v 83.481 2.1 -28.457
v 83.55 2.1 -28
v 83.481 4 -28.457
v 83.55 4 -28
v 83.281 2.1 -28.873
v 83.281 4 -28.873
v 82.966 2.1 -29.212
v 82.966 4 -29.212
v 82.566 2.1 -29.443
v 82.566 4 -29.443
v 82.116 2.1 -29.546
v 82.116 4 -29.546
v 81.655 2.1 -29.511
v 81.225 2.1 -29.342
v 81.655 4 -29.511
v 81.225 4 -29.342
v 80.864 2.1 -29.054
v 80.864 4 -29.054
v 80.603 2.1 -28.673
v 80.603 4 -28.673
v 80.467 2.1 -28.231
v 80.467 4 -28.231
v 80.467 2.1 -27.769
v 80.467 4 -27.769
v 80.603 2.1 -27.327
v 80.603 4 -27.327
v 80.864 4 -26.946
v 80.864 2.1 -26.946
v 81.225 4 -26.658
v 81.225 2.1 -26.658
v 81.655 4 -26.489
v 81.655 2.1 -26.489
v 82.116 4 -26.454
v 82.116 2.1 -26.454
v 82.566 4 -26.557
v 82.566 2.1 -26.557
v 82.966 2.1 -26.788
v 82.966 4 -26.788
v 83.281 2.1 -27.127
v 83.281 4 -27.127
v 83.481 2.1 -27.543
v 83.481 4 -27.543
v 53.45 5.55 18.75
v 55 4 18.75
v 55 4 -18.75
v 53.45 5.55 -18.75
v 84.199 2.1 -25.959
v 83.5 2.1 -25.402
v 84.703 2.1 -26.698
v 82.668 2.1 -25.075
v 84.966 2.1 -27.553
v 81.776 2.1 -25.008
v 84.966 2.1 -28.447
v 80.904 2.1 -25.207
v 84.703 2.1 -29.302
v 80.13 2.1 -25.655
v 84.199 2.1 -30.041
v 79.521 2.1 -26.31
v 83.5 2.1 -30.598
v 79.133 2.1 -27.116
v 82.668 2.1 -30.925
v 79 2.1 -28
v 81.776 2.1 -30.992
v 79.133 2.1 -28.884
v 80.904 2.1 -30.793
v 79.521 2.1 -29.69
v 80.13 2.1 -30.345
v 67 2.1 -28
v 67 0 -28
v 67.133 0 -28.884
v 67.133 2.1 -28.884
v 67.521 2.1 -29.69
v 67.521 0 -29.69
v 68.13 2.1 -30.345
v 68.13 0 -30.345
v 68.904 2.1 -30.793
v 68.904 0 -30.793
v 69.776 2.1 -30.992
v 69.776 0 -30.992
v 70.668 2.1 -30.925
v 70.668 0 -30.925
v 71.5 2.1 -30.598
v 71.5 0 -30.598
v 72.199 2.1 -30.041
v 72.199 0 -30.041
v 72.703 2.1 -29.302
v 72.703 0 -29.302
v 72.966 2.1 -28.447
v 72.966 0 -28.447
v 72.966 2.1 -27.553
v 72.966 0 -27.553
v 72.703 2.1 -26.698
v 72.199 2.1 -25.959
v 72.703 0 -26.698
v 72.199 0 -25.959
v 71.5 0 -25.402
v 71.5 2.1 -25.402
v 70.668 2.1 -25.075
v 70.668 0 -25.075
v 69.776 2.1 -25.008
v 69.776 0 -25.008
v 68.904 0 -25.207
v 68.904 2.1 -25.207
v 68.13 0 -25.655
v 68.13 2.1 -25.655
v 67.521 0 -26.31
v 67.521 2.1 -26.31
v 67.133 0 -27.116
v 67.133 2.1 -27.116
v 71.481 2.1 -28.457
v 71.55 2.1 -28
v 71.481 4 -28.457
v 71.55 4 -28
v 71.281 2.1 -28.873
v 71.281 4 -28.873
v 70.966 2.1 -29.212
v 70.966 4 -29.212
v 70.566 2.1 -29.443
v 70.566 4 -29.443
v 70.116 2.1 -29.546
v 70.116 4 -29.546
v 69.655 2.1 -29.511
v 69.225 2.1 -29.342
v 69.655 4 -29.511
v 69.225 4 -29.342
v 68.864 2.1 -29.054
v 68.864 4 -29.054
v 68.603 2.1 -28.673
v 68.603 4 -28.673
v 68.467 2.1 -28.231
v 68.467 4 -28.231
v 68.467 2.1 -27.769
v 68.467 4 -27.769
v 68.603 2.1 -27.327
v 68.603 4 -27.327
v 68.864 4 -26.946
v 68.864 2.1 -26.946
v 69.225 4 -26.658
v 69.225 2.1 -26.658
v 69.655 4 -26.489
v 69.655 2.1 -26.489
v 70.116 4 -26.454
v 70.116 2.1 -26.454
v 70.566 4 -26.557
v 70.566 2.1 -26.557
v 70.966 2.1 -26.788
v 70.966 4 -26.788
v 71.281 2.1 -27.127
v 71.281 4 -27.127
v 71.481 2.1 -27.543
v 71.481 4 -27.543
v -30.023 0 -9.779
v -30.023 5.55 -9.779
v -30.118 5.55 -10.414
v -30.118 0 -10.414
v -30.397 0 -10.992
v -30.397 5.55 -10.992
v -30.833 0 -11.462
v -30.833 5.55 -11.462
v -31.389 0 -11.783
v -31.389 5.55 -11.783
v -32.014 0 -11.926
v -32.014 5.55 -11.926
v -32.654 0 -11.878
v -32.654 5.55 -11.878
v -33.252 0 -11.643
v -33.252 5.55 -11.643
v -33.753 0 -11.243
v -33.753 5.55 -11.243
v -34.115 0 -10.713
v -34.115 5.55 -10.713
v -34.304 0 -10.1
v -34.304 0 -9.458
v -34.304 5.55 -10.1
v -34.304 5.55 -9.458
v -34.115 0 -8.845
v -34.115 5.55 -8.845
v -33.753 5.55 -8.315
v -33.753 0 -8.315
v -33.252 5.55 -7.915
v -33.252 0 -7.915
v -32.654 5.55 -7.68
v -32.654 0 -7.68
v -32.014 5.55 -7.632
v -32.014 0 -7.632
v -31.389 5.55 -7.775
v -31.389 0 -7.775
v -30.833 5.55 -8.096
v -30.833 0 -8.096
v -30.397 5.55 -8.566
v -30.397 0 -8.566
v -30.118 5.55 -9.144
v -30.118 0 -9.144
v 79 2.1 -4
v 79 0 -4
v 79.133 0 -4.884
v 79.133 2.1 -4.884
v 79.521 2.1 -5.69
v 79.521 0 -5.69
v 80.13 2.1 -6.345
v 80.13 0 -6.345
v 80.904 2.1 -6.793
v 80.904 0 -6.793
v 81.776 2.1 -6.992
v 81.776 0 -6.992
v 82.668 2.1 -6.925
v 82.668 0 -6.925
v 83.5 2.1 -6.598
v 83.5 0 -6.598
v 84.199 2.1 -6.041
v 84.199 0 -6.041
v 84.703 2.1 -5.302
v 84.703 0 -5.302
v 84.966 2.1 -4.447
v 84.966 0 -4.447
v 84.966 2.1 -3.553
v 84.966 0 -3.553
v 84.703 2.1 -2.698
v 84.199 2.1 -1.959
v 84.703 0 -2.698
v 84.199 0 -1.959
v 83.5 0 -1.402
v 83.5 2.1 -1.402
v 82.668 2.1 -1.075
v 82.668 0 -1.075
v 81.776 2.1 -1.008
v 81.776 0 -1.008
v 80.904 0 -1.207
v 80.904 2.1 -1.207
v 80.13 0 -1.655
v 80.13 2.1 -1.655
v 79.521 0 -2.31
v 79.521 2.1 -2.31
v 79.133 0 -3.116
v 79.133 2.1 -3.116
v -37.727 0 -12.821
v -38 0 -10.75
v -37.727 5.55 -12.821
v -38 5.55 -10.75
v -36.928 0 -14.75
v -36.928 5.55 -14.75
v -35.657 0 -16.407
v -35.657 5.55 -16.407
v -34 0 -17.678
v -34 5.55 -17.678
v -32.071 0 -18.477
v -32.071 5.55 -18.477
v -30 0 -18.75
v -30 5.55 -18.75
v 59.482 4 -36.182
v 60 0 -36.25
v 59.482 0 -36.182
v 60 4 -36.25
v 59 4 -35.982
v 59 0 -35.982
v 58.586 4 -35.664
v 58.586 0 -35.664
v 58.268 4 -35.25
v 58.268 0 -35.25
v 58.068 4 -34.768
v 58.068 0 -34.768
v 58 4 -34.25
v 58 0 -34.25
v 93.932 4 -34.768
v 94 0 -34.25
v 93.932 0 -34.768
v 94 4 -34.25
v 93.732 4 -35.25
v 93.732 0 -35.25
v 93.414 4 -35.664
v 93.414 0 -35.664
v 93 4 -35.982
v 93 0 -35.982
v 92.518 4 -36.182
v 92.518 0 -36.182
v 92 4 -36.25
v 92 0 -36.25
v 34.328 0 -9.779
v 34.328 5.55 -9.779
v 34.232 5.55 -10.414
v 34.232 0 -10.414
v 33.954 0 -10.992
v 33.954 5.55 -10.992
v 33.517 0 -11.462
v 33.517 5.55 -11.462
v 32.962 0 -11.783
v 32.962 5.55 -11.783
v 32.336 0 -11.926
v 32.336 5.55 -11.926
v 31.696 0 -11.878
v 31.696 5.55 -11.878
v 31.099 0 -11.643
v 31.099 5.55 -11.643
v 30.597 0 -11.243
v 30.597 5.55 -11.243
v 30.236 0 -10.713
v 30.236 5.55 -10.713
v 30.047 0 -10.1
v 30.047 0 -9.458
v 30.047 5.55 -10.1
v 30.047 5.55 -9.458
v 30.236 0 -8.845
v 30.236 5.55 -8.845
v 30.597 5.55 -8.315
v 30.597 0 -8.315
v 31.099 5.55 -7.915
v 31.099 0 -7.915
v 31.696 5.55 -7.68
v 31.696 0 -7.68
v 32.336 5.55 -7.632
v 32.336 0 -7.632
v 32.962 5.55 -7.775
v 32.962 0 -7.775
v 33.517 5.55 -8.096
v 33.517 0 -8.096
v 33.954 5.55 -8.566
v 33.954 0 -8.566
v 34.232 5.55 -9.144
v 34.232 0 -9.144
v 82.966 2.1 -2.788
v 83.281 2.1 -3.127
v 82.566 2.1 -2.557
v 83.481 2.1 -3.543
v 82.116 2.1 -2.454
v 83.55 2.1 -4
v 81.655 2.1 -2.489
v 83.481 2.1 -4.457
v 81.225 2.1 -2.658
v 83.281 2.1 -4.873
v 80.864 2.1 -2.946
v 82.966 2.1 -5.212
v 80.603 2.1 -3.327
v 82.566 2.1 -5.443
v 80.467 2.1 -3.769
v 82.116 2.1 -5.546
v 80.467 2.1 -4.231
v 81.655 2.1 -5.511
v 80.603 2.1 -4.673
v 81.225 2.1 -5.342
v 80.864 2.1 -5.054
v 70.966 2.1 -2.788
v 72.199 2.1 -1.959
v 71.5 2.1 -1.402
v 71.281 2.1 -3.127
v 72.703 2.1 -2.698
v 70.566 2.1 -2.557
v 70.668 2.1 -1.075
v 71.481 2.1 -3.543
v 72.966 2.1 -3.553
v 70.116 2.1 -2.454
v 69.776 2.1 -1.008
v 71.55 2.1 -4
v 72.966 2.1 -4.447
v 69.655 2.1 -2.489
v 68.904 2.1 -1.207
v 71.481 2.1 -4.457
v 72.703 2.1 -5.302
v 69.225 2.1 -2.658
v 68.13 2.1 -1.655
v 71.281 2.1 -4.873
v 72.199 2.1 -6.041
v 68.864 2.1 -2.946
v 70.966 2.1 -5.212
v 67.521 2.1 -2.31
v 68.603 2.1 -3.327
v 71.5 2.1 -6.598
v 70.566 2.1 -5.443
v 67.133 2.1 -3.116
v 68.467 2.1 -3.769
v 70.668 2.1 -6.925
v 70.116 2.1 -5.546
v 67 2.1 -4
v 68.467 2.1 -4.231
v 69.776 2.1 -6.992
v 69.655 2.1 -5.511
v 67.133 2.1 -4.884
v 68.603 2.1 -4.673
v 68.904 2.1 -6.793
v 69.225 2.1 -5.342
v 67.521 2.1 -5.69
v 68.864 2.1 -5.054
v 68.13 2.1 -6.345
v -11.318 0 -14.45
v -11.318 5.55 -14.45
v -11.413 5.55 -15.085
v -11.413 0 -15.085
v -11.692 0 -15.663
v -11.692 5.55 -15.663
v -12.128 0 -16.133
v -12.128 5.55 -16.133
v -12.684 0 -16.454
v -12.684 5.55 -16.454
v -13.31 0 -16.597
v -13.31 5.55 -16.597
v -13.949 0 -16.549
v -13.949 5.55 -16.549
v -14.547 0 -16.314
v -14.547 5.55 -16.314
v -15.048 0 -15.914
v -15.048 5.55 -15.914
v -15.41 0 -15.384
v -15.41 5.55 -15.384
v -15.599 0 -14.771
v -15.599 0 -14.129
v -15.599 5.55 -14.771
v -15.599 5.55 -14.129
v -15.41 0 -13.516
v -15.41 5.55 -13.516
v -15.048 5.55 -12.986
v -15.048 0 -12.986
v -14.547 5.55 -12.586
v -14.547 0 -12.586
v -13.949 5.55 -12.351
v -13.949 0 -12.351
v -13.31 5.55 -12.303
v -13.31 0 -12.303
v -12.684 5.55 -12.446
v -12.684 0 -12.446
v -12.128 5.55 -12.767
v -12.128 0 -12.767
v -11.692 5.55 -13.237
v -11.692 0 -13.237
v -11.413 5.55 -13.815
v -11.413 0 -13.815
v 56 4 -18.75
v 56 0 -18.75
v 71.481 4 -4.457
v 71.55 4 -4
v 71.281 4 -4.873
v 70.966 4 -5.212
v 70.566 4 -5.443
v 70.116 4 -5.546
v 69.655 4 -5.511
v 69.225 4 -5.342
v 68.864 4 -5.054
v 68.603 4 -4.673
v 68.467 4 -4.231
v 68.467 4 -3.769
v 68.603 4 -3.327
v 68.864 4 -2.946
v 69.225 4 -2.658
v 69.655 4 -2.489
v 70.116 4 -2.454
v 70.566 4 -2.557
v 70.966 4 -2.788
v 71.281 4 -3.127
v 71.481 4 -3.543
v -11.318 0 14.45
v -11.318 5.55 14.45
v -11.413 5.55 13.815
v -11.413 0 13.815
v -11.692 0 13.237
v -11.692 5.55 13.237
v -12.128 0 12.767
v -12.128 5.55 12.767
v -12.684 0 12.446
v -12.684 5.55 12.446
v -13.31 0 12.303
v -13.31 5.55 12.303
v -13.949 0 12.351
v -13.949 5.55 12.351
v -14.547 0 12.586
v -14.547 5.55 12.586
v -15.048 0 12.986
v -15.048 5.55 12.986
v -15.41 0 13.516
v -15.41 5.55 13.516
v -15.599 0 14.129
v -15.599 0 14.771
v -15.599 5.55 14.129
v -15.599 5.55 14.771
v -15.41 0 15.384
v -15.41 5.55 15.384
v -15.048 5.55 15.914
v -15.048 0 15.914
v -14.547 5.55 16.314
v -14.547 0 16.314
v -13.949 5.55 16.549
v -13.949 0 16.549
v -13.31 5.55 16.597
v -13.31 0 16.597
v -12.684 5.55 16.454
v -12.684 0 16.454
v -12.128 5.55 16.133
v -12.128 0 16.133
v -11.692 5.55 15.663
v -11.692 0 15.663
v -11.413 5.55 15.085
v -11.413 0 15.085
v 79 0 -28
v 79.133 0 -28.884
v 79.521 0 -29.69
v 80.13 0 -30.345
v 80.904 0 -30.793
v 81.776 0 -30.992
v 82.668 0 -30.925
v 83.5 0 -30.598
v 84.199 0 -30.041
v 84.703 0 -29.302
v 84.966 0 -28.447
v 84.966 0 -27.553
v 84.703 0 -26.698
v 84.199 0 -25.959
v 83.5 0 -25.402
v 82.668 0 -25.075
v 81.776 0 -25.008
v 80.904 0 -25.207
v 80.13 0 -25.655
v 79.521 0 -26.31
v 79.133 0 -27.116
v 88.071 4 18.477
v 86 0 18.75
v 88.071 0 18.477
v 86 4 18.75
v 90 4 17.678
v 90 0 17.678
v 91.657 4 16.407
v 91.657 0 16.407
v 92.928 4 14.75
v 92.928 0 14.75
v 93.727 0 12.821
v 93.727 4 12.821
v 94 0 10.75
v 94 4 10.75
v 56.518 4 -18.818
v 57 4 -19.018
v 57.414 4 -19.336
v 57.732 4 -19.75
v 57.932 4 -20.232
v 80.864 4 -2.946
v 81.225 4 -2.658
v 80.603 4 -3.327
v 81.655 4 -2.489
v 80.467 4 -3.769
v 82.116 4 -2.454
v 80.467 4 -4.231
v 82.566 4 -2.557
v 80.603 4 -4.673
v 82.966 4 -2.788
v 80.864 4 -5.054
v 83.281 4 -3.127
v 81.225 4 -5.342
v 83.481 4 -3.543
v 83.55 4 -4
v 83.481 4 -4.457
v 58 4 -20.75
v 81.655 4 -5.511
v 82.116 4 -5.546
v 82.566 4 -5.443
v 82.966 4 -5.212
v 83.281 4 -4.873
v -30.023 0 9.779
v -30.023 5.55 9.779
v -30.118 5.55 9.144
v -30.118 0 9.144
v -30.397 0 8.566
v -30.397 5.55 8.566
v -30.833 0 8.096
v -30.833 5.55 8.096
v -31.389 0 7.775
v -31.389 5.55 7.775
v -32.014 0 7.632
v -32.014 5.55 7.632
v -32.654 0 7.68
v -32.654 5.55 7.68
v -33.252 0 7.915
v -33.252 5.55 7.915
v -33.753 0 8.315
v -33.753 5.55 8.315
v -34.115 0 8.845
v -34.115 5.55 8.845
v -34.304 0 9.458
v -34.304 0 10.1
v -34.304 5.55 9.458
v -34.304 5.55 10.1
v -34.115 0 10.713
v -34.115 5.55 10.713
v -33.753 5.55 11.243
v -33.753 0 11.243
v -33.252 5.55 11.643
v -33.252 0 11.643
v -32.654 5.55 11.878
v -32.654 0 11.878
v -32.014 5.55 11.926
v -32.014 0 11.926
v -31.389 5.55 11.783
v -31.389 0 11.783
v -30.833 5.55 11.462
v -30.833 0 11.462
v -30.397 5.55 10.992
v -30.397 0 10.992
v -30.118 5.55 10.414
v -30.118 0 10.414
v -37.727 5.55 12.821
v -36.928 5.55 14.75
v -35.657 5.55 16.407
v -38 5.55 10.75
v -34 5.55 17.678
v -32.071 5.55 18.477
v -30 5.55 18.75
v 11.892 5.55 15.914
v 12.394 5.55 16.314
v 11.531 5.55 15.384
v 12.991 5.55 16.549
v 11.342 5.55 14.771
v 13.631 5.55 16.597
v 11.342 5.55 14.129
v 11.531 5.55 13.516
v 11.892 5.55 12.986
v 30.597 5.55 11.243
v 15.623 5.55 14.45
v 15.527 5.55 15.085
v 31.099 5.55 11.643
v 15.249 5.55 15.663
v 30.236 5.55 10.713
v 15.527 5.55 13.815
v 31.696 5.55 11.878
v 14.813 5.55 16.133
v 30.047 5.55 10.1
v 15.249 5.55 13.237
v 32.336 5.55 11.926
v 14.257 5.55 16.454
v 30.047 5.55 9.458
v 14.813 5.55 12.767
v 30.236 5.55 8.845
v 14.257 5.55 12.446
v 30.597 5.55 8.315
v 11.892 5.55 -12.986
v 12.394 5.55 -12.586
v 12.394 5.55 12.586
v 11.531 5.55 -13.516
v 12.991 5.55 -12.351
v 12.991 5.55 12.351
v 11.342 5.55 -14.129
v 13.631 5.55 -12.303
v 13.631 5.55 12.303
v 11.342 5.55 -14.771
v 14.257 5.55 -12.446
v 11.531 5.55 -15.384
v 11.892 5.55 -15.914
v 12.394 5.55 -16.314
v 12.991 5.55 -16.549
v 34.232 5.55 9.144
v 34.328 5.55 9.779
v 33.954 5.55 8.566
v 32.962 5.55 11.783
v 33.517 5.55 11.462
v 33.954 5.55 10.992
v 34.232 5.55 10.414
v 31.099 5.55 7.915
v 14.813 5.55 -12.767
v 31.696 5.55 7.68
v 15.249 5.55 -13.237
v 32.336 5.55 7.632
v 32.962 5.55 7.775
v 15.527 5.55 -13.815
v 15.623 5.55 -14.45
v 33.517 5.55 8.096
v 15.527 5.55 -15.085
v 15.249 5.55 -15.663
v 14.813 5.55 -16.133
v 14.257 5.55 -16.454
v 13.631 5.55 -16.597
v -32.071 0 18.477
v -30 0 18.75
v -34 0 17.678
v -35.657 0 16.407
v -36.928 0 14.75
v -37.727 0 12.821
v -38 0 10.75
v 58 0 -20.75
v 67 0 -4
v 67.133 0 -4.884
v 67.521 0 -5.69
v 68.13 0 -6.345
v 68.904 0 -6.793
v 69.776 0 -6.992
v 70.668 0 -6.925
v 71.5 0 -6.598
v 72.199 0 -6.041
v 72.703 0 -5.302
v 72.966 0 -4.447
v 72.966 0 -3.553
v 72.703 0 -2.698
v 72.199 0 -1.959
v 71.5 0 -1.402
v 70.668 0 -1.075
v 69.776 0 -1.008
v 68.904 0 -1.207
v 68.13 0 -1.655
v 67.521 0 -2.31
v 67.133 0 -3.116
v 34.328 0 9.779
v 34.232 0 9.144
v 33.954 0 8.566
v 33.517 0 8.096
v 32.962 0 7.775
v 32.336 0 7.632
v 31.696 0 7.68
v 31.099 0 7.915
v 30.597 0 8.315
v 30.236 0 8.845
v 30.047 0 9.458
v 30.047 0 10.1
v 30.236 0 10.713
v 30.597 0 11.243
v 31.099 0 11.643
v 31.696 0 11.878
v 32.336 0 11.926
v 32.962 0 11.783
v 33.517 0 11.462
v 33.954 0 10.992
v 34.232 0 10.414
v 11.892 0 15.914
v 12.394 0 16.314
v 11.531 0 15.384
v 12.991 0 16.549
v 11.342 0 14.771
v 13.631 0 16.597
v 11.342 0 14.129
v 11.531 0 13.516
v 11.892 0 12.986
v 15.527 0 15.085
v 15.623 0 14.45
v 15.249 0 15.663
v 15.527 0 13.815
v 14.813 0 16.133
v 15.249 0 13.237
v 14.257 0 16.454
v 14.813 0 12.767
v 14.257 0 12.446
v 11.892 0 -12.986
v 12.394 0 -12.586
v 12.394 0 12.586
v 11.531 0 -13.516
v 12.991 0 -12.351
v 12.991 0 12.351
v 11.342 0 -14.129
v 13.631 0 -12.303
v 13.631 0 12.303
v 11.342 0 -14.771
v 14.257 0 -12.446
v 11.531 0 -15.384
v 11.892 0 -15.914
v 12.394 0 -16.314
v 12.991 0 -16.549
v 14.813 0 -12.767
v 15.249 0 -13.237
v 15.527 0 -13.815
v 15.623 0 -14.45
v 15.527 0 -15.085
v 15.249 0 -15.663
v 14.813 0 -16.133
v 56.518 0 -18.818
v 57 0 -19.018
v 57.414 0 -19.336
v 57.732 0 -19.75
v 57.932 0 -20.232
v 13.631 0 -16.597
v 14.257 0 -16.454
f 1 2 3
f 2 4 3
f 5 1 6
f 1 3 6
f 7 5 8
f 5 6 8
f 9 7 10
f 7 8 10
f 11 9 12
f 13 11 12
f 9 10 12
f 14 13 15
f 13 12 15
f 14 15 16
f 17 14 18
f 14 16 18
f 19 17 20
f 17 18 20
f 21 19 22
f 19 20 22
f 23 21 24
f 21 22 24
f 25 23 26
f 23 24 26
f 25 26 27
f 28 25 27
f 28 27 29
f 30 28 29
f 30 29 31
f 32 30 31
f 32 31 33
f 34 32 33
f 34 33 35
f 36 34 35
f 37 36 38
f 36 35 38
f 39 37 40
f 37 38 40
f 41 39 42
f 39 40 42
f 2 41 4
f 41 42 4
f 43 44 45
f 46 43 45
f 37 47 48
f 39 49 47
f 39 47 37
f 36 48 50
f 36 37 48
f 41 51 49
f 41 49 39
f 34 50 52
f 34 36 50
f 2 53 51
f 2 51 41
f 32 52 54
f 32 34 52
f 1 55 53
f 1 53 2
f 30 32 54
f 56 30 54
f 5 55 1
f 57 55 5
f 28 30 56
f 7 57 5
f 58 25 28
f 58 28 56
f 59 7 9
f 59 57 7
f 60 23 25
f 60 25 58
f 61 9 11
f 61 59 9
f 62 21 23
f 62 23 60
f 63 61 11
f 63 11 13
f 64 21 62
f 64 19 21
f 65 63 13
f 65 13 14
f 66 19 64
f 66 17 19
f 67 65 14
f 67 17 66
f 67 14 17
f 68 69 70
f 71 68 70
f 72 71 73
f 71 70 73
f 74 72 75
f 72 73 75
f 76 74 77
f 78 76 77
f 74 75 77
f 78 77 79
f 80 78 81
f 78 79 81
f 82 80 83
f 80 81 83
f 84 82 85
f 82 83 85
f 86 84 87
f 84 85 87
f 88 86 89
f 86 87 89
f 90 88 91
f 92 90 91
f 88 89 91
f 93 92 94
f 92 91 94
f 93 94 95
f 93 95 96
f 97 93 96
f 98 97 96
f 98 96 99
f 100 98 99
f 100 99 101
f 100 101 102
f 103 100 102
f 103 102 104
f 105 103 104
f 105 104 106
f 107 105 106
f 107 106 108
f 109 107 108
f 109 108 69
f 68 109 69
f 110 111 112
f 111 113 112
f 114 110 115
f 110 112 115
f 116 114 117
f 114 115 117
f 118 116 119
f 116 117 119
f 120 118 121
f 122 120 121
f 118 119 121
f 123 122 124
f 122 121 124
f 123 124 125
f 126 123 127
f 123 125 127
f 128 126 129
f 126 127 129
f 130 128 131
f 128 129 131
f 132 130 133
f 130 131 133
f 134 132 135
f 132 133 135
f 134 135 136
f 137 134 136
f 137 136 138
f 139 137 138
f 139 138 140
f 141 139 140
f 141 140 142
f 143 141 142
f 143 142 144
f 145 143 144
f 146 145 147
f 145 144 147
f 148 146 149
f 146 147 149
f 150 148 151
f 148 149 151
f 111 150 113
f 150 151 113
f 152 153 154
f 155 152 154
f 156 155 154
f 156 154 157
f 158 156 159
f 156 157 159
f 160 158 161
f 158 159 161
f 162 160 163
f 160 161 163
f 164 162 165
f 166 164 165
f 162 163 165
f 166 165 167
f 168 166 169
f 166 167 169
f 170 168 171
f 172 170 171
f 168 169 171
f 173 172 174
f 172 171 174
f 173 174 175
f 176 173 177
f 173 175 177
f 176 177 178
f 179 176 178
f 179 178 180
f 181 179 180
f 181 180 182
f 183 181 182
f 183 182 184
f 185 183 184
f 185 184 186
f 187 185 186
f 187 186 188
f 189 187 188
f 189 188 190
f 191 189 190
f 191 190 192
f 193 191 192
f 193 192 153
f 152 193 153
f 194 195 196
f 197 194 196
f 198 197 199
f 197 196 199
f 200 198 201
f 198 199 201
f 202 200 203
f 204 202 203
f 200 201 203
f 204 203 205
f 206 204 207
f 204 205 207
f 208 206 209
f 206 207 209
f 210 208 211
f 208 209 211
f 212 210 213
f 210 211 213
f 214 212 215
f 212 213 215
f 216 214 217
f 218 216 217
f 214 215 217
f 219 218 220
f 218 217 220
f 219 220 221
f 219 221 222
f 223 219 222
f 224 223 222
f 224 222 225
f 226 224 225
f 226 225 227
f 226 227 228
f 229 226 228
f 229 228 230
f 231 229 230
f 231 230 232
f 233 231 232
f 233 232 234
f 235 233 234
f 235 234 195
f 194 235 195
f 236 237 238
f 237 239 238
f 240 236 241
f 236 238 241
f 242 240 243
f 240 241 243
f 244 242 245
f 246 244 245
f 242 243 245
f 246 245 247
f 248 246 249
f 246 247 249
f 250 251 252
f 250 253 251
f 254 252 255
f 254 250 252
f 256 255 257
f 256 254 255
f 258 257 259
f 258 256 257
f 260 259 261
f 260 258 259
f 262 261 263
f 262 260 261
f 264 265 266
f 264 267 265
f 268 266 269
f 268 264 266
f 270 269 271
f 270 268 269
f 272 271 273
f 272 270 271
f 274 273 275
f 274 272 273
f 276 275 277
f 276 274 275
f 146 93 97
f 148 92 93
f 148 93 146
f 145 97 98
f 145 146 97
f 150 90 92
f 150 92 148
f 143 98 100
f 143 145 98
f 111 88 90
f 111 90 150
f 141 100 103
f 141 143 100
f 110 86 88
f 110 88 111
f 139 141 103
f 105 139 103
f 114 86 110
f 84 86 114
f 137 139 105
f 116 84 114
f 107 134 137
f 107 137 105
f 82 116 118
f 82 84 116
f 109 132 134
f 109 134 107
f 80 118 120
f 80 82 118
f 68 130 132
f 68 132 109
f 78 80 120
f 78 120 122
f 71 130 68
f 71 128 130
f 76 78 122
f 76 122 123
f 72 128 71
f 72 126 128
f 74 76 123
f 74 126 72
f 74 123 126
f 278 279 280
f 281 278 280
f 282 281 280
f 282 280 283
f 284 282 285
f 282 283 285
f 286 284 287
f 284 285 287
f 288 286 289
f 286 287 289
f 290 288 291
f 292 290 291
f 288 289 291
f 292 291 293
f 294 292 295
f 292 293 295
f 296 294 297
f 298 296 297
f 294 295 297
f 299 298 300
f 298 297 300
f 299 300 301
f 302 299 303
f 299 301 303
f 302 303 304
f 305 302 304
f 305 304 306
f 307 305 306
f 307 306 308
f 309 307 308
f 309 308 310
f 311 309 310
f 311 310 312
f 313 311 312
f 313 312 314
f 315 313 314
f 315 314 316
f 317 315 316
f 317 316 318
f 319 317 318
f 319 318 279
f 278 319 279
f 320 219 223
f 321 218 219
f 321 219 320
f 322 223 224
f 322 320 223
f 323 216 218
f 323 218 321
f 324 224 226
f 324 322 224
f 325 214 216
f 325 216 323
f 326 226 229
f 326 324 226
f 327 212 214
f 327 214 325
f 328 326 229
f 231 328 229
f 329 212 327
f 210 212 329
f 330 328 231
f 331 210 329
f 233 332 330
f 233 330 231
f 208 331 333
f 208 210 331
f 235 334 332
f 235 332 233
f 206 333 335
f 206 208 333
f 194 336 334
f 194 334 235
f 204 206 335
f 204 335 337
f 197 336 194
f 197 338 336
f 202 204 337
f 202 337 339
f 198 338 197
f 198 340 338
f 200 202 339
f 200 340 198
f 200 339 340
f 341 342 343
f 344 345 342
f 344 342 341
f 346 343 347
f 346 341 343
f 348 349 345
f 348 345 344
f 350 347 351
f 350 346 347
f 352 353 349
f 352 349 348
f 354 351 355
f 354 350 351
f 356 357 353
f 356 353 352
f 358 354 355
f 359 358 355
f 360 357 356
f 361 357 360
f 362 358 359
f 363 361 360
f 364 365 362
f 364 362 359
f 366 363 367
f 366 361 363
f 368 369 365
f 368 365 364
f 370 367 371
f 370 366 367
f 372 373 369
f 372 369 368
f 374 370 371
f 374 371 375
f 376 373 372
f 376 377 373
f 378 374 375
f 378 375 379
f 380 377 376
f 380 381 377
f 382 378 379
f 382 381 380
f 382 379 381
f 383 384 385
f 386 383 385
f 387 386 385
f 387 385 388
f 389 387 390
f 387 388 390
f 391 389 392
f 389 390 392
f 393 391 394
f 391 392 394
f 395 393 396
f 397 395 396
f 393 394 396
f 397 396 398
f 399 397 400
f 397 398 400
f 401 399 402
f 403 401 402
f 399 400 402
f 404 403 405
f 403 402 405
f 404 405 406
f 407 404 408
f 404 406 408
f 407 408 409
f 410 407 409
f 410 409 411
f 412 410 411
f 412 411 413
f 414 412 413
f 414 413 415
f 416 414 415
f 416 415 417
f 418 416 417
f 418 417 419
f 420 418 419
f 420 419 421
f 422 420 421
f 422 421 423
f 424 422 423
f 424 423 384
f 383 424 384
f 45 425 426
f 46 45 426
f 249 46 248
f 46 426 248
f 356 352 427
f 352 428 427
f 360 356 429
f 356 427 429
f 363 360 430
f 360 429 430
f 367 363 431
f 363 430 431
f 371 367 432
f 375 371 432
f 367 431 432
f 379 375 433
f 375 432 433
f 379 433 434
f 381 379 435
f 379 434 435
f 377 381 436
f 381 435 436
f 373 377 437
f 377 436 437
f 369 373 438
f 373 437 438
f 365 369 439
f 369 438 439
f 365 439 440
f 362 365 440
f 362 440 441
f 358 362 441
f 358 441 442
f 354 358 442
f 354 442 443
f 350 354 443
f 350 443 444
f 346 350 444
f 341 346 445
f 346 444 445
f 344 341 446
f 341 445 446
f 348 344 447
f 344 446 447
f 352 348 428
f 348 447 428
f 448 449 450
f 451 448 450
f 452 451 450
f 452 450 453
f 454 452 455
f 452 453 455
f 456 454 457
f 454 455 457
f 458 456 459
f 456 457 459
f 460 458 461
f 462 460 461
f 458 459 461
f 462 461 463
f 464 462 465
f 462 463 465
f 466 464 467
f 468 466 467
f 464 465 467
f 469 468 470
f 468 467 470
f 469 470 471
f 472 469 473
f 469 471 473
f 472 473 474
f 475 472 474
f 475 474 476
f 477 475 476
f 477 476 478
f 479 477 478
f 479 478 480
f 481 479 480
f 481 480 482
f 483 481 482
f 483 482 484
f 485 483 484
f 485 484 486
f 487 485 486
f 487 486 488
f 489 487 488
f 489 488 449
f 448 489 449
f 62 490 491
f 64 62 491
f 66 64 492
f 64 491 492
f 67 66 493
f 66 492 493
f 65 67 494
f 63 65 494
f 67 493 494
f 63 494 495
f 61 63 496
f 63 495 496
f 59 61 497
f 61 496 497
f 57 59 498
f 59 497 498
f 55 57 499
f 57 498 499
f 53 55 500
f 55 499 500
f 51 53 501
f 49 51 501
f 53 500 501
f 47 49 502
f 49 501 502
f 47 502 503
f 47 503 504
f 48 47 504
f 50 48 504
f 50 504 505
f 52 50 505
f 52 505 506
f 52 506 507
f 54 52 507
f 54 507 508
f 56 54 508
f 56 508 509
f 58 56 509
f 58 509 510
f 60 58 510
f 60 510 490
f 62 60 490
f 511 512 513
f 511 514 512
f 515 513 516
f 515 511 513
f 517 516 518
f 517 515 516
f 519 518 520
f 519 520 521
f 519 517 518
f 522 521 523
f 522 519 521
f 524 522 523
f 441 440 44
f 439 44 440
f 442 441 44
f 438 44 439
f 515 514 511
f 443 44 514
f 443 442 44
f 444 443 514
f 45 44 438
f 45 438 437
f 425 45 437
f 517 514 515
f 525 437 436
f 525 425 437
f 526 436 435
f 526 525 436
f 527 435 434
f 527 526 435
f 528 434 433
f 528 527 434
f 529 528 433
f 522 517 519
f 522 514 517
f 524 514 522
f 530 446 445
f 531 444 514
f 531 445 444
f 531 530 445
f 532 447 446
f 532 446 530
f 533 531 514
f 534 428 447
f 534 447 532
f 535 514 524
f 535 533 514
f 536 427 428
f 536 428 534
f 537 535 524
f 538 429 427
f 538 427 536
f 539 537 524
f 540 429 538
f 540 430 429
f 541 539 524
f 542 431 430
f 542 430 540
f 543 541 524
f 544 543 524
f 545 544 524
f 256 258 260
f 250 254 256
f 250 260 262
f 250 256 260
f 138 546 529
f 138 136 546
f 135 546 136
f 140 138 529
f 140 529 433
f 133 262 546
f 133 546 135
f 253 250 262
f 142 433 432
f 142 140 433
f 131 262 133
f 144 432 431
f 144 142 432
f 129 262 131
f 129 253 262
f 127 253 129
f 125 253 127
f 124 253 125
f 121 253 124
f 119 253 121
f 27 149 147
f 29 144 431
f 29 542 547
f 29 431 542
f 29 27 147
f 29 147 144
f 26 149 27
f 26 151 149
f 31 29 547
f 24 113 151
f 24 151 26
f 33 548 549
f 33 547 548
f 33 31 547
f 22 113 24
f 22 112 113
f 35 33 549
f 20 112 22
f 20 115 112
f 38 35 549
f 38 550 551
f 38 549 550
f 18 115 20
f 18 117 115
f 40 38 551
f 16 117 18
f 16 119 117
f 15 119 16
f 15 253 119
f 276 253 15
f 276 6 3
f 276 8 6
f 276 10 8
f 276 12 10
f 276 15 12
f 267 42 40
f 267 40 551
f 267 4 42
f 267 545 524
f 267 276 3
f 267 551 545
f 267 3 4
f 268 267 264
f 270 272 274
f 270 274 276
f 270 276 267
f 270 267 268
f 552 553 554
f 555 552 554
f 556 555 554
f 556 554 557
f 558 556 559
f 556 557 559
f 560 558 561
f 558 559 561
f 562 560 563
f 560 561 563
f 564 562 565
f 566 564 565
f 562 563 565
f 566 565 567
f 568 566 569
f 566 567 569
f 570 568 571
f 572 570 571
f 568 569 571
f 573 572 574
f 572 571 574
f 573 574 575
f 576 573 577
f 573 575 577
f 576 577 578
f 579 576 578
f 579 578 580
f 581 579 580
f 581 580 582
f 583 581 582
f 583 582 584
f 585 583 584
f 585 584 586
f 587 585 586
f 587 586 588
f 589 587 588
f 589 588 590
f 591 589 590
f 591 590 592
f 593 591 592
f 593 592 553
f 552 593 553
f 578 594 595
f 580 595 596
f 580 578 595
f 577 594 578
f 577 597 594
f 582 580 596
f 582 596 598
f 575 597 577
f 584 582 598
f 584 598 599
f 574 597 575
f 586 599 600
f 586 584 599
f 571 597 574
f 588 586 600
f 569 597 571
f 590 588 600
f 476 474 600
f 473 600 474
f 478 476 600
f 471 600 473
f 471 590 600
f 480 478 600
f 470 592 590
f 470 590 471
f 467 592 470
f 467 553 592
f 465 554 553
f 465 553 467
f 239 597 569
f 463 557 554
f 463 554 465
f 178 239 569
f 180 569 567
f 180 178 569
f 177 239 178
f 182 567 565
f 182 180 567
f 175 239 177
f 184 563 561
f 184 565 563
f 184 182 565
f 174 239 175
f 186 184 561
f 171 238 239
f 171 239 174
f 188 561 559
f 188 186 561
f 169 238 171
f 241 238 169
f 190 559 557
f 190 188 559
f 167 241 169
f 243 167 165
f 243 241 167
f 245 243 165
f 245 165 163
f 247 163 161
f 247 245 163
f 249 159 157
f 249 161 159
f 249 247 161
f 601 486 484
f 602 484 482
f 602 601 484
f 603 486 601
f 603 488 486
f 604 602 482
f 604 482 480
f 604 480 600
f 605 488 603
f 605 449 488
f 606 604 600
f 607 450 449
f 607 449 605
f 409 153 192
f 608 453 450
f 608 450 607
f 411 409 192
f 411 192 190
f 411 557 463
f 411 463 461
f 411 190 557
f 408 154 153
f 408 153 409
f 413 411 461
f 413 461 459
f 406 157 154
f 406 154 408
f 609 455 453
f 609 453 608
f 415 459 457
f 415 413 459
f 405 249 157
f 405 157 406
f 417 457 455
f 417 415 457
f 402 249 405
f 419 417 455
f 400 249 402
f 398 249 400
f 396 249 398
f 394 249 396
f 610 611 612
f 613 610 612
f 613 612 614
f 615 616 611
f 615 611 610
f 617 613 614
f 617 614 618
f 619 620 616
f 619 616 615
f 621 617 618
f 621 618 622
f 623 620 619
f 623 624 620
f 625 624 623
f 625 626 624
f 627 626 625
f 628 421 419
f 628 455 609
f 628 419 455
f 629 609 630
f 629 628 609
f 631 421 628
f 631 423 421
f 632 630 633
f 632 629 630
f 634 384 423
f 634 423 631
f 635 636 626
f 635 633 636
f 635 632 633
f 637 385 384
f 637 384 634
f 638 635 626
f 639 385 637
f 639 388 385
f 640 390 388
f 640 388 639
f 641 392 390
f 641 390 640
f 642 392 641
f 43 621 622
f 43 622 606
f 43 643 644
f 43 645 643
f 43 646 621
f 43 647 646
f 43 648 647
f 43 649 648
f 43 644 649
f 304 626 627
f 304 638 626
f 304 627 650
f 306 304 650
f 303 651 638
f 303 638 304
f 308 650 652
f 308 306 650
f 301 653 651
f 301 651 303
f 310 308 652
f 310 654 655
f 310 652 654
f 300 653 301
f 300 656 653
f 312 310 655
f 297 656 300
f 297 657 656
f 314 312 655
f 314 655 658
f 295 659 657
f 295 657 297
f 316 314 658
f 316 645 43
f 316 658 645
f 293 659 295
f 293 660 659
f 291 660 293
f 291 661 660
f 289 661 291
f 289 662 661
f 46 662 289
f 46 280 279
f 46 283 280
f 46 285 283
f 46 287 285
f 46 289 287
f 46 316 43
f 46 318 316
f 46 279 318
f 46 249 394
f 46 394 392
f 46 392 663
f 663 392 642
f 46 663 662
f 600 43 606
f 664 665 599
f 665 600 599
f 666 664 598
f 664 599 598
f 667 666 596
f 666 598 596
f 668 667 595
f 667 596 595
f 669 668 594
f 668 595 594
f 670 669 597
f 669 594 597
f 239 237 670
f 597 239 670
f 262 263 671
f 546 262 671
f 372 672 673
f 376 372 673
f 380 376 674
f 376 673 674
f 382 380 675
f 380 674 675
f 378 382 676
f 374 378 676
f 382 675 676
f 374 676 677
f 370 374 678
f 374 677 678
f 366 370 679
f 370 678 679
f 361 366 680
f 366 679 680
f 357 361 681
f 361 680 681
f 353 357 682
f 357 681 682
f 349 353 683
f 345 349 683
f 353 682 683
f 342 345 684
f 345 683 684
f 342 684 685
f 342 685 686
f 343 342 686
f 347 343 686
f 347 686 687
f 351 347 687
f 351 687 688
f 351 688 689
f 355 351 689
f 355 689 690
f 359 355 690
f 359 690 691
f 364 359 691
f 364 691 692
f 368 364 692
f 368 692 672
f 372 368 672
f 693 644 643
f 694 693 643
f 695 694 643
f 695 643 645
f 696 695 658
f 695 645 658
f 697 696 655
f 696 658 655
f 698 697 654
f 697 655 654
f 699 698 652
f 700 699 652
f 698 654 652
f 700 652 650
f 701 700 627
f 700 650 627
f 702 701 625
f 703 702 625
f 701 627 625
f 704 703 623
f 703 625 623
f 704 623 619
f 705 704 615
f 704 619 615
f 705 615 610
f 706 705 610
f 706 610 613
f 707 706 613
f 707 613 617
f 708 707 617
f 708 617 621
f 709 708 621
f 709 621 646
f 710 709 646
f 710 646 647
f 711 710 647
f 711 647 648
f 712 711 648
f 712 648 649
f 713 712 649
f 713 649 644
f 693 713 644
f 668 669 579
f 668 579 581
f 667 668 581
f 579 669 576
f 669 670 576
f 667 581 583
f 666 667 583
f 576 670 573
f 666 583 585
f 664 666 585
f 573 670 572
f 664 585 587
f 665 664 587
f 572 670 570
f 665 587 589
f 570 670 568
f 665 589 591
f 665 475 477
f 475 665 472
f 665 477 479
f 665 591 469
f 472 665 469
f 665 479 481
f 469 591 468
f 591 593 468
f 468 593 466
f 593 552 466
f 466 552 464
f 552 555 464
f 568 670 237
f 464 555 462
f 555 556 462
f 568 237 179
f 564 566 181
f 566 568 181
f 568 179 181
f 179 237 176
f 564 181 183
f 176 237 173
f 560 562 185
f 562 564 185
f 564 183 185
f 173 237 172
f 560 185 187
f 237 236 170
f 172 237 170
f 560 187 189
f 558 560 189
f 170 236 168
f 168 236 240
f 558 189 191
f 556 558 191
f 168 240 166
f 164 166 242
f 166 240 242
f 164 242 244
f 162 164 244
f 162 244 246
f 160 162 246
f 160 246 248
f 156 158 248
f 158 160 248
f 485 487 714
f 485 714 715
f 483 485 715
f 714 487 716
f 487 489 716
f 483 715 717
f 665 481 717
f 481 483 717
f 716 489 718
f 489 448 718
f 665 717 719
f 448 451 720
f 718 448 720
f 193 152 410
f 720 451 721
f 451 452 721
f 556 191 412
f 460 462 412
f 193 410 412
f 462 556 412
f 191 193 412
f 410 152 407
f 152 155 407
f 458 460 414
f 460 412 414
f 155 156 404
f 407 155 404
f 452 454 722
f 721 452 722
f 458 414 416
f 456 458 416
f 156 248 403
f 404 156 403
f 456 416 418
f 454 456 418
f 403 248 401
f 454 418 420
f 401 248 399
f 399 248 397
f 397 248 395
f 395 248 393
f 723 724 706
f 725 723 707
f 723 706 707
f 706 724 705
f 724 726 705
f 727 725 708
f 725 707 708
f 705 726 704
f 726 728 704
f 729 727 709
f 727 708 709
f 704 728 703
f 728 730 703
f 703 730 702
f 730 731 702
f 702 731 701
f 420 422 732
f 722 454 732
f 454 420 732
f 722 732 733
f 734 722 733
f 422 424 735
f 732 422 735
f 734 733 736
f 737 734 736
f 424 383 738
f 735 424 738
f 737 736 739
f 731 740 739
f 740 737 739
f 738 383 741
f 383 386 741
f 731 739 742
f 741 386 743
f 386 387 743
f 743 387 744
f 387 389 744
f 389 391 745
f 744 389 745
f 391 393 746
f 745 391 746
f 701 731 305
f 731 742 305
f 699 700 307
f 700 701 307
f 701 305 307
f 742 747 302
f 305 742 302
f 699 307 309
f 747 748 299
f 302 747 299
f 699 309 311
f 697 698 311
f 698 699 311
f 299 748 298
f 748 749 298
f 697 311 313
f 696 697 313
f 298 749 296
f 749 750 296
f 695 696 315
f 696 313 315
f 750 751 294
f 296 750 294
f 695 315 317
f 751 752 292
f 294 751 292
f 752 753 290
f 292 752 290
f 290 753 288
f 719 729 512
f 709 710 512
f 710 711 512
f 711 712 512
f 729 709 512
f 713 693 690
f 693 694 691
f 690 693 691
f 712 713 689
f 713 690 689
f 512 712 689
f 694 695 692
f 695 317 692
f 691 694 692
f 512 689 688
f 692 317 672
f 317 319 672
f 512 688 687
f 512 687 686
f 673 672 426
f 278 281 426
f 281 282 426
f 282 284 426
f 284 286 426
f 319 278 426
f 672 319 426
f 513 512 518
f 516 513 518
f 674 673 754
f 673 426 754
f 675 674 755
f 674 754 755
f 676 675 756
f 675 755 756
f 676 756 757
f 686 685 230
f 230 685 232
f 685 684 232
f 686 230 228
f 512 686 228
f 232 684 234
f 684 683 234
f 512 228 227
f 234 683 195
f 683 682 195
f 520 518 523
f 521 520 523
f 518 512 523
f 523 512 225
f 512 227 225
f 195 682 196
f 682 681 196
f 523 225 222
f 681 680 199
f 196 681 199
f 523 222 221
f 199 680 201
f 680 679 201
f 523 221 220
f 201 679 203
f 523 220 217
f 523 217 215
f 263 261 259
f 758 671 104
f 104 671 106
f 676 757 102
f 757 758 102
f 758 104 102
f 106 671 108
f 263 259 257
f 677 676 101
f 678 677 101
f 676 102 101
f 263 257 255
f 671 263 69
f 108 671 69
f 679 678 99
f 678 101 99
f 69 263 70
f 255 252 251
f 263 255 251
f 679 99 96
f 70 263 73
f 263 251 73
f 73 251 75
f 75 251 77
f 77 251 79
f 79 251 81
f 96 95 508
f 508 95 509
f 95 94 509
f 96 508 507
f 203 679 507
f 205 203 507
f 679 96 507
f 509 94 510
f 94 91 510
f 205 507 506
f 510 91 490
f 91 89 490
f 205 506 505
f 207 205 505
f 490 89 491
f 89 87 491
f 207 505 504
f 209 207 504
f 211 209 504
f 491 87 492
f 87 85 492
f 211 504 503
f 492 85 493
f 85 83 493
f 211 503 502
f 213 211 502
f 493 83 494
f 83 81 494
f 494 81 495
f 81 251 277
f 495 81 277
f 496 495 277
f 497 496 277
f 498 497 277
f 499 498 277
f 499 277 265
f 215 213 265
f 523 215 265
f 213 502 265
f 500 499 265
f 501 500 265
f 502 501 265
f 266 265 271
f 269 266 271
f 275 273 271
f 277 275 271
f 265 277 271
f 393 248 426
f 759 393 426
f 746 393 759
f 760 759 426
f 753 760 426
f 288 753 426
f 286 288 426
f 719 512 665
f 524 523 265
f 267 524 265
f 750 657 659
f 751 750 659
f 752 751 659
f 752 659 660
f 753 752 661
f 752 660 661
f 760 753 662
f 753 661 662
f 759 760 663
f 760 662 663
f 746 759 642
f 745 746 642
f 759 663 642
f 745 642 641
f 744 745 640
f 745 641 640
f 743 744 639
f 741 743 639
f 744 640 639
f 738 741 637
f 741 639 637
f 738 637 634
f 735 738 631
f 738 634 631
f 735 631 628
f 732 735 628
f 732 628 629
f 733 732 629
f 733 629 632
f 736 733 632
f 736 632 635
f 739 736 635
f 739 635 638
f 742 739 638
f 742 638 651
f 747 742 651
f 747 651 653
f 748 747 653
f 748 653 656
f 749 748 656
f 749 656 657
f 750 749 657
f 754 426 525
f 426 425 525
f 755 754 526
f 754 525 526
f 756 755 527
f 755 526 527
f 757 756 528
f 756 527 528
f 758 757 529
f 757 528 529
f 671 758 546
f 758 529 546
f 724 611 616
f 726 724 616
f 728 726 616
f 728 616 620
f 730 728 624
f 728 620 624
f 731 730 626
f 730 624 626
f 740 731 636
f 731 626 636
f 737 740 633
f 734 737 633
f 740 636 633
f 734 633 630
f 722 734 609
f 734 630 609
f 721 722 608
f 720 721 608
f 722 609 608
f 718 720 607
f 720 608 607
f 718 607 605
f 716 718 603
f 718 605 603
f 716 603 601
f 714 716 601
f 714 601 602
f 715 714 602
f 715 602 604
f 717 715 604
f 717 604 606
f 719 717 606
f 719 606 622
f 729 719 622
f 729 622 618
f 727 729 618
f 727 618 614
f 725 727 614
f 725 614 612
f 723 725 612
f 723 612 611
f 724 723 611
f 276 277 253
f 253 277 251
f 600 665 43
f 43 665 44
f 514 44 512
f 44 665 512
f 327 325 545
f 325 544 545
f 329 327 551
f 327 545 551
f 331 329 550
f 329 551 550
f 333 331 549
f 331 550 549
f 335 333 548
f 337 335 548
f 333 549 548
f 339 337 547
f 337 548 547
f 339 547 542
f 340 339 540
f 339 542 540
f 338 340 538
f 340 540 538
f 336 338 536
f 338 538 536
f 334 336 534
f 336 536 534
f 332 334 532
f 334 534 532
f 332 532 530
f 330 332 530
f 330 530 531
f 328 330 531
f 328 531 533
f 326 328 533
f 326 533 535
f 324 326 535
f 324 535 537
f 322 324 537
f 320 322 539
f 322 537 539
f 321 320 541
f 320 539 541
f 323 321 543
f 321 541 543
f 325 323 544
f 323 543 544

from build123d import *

# Parameters (mm, degrees)
BOSS_EXTRUDE1_DEPTH                                = 5.55
SKETCH2_W                                          = 39
SKETCH2_H                                          = 55
CUT_EXTRUDE1_DEPTH                                 = 1.55
FILLET1_R                                          = 8
CBORE_FOR_M2_5_PAN_HEAD_MACHINE_SCREW1_D           = 3.1
CBORE_FOR_M2_5_PAN_HEAD_MACHINE_SCREW1_CBORE_D     = 6
CBORE_FOR_M2_5_PAN_HEAD_MACHINE_SCREW1_CBORE_DEPTH = 2.1
FILLET2_R                                          = 2
CHAMFER1_SIZE                                      = 1.55
F_6_CLEARANCE_HOLE1_D                              = 4.3053


with BuildPart() as part:
    # Sketch1 → Boss-Extrude1 (new body)
    with BuildSketch(Plane(origin=(0, 0, 0), x_dir=(1, 0, 0), z_dir=(0, 1, 0))):
        Polygon((-38, -18.75), (94, -18.75), (94, 36.25), (58, 36.25), (58, 18.75), (-38, 18.75), align=None)
    extrude(amount=BOSS_EXTRUDE1_DEPTH)

    # Sketch2 → Cut-Extrude1 (cut)
    with BuildSketch(Plane(origin=(0, 5.55, 0), x_dir=(1, 0, 0), z_dir=(0, 1, 0))):
        with Locations((74.5, 8.75)):
            Rectangle(SKETCH2_W, SKETCH2_H)
    extrude(amount=-CUT_EXTRUDE1_DEPTH, mode=Mode.SUBTRACT)

    # Fillet1
    fillet1_edges = [part.edges().sort_by_distance(p)[0] for p in [
        (-38, 2.775, 18.75),
        (-38, 2.775, -18.75),
        (94, 2, 18.75),
    ]]
    fillet(fillet1_edges, radius=FILLET1_R)

    # CBORE for M2.5 Pan Head Machine Screw1 (through all)
    with Locations(Plane(origin=(0, 0, 0), x_dir=(-1, 0, 0), z_dir=(0, -1, 0))):
        with Locations((-82, 28), (-82, 4), (-70, 4), (-70, 28)):
            CounterBoreHole(CBORE_FOR_M2_5_PAN_HEAD_MACHINE_SCREW1_D / 2, CBORE_FOR_M2_5_PAN_HEAD_MACHINE_SCREW1_CBORE_D / 2, CBORE_FOR_M2_5_PAN_HEAD_MACHINE_SCREW1_CBORE_DEPTH)

    # Fillet2
    fillet2_edges = [part.edges().sort_by_distance(p)[0] for p in [
        (94, 2, -36.25),
        (58, 2, -18.75),
        (58, 2, -36.25),
    ]]
    fillet(fillet2_edges, radius=FILLET2_R)

    # Chamfer1
    chamfer1_edges = [part.edges().sort_by_distance(p)[0] for p in [
        (55, 5.55, 0),
    ]]
    chamfer(chamfer1_edges, length=CHAMFER1_SIZE - 0.0001)  # a hair under: the kernel refuses the full size

    # #6 Clearance Hole1 (through all)
    with Locations(Plane(origin=(0, 0, 0), x_dir=(-1, 0, 0), z_dir=(0, -1, 0))):
        with Locations((-32.175187039, 9.779), (-32.175187039, -9.779), (32.175187039, 9.779), (32.175187039, -9.779), (13.470384182, -14.45), (-13.470384182, -14.45), (13.470384182, 14.45), (-13.470384182, 14.45)):
            Hole(F_6_CLEARANCE_HOLE1_D / 2)


solid = part.part
